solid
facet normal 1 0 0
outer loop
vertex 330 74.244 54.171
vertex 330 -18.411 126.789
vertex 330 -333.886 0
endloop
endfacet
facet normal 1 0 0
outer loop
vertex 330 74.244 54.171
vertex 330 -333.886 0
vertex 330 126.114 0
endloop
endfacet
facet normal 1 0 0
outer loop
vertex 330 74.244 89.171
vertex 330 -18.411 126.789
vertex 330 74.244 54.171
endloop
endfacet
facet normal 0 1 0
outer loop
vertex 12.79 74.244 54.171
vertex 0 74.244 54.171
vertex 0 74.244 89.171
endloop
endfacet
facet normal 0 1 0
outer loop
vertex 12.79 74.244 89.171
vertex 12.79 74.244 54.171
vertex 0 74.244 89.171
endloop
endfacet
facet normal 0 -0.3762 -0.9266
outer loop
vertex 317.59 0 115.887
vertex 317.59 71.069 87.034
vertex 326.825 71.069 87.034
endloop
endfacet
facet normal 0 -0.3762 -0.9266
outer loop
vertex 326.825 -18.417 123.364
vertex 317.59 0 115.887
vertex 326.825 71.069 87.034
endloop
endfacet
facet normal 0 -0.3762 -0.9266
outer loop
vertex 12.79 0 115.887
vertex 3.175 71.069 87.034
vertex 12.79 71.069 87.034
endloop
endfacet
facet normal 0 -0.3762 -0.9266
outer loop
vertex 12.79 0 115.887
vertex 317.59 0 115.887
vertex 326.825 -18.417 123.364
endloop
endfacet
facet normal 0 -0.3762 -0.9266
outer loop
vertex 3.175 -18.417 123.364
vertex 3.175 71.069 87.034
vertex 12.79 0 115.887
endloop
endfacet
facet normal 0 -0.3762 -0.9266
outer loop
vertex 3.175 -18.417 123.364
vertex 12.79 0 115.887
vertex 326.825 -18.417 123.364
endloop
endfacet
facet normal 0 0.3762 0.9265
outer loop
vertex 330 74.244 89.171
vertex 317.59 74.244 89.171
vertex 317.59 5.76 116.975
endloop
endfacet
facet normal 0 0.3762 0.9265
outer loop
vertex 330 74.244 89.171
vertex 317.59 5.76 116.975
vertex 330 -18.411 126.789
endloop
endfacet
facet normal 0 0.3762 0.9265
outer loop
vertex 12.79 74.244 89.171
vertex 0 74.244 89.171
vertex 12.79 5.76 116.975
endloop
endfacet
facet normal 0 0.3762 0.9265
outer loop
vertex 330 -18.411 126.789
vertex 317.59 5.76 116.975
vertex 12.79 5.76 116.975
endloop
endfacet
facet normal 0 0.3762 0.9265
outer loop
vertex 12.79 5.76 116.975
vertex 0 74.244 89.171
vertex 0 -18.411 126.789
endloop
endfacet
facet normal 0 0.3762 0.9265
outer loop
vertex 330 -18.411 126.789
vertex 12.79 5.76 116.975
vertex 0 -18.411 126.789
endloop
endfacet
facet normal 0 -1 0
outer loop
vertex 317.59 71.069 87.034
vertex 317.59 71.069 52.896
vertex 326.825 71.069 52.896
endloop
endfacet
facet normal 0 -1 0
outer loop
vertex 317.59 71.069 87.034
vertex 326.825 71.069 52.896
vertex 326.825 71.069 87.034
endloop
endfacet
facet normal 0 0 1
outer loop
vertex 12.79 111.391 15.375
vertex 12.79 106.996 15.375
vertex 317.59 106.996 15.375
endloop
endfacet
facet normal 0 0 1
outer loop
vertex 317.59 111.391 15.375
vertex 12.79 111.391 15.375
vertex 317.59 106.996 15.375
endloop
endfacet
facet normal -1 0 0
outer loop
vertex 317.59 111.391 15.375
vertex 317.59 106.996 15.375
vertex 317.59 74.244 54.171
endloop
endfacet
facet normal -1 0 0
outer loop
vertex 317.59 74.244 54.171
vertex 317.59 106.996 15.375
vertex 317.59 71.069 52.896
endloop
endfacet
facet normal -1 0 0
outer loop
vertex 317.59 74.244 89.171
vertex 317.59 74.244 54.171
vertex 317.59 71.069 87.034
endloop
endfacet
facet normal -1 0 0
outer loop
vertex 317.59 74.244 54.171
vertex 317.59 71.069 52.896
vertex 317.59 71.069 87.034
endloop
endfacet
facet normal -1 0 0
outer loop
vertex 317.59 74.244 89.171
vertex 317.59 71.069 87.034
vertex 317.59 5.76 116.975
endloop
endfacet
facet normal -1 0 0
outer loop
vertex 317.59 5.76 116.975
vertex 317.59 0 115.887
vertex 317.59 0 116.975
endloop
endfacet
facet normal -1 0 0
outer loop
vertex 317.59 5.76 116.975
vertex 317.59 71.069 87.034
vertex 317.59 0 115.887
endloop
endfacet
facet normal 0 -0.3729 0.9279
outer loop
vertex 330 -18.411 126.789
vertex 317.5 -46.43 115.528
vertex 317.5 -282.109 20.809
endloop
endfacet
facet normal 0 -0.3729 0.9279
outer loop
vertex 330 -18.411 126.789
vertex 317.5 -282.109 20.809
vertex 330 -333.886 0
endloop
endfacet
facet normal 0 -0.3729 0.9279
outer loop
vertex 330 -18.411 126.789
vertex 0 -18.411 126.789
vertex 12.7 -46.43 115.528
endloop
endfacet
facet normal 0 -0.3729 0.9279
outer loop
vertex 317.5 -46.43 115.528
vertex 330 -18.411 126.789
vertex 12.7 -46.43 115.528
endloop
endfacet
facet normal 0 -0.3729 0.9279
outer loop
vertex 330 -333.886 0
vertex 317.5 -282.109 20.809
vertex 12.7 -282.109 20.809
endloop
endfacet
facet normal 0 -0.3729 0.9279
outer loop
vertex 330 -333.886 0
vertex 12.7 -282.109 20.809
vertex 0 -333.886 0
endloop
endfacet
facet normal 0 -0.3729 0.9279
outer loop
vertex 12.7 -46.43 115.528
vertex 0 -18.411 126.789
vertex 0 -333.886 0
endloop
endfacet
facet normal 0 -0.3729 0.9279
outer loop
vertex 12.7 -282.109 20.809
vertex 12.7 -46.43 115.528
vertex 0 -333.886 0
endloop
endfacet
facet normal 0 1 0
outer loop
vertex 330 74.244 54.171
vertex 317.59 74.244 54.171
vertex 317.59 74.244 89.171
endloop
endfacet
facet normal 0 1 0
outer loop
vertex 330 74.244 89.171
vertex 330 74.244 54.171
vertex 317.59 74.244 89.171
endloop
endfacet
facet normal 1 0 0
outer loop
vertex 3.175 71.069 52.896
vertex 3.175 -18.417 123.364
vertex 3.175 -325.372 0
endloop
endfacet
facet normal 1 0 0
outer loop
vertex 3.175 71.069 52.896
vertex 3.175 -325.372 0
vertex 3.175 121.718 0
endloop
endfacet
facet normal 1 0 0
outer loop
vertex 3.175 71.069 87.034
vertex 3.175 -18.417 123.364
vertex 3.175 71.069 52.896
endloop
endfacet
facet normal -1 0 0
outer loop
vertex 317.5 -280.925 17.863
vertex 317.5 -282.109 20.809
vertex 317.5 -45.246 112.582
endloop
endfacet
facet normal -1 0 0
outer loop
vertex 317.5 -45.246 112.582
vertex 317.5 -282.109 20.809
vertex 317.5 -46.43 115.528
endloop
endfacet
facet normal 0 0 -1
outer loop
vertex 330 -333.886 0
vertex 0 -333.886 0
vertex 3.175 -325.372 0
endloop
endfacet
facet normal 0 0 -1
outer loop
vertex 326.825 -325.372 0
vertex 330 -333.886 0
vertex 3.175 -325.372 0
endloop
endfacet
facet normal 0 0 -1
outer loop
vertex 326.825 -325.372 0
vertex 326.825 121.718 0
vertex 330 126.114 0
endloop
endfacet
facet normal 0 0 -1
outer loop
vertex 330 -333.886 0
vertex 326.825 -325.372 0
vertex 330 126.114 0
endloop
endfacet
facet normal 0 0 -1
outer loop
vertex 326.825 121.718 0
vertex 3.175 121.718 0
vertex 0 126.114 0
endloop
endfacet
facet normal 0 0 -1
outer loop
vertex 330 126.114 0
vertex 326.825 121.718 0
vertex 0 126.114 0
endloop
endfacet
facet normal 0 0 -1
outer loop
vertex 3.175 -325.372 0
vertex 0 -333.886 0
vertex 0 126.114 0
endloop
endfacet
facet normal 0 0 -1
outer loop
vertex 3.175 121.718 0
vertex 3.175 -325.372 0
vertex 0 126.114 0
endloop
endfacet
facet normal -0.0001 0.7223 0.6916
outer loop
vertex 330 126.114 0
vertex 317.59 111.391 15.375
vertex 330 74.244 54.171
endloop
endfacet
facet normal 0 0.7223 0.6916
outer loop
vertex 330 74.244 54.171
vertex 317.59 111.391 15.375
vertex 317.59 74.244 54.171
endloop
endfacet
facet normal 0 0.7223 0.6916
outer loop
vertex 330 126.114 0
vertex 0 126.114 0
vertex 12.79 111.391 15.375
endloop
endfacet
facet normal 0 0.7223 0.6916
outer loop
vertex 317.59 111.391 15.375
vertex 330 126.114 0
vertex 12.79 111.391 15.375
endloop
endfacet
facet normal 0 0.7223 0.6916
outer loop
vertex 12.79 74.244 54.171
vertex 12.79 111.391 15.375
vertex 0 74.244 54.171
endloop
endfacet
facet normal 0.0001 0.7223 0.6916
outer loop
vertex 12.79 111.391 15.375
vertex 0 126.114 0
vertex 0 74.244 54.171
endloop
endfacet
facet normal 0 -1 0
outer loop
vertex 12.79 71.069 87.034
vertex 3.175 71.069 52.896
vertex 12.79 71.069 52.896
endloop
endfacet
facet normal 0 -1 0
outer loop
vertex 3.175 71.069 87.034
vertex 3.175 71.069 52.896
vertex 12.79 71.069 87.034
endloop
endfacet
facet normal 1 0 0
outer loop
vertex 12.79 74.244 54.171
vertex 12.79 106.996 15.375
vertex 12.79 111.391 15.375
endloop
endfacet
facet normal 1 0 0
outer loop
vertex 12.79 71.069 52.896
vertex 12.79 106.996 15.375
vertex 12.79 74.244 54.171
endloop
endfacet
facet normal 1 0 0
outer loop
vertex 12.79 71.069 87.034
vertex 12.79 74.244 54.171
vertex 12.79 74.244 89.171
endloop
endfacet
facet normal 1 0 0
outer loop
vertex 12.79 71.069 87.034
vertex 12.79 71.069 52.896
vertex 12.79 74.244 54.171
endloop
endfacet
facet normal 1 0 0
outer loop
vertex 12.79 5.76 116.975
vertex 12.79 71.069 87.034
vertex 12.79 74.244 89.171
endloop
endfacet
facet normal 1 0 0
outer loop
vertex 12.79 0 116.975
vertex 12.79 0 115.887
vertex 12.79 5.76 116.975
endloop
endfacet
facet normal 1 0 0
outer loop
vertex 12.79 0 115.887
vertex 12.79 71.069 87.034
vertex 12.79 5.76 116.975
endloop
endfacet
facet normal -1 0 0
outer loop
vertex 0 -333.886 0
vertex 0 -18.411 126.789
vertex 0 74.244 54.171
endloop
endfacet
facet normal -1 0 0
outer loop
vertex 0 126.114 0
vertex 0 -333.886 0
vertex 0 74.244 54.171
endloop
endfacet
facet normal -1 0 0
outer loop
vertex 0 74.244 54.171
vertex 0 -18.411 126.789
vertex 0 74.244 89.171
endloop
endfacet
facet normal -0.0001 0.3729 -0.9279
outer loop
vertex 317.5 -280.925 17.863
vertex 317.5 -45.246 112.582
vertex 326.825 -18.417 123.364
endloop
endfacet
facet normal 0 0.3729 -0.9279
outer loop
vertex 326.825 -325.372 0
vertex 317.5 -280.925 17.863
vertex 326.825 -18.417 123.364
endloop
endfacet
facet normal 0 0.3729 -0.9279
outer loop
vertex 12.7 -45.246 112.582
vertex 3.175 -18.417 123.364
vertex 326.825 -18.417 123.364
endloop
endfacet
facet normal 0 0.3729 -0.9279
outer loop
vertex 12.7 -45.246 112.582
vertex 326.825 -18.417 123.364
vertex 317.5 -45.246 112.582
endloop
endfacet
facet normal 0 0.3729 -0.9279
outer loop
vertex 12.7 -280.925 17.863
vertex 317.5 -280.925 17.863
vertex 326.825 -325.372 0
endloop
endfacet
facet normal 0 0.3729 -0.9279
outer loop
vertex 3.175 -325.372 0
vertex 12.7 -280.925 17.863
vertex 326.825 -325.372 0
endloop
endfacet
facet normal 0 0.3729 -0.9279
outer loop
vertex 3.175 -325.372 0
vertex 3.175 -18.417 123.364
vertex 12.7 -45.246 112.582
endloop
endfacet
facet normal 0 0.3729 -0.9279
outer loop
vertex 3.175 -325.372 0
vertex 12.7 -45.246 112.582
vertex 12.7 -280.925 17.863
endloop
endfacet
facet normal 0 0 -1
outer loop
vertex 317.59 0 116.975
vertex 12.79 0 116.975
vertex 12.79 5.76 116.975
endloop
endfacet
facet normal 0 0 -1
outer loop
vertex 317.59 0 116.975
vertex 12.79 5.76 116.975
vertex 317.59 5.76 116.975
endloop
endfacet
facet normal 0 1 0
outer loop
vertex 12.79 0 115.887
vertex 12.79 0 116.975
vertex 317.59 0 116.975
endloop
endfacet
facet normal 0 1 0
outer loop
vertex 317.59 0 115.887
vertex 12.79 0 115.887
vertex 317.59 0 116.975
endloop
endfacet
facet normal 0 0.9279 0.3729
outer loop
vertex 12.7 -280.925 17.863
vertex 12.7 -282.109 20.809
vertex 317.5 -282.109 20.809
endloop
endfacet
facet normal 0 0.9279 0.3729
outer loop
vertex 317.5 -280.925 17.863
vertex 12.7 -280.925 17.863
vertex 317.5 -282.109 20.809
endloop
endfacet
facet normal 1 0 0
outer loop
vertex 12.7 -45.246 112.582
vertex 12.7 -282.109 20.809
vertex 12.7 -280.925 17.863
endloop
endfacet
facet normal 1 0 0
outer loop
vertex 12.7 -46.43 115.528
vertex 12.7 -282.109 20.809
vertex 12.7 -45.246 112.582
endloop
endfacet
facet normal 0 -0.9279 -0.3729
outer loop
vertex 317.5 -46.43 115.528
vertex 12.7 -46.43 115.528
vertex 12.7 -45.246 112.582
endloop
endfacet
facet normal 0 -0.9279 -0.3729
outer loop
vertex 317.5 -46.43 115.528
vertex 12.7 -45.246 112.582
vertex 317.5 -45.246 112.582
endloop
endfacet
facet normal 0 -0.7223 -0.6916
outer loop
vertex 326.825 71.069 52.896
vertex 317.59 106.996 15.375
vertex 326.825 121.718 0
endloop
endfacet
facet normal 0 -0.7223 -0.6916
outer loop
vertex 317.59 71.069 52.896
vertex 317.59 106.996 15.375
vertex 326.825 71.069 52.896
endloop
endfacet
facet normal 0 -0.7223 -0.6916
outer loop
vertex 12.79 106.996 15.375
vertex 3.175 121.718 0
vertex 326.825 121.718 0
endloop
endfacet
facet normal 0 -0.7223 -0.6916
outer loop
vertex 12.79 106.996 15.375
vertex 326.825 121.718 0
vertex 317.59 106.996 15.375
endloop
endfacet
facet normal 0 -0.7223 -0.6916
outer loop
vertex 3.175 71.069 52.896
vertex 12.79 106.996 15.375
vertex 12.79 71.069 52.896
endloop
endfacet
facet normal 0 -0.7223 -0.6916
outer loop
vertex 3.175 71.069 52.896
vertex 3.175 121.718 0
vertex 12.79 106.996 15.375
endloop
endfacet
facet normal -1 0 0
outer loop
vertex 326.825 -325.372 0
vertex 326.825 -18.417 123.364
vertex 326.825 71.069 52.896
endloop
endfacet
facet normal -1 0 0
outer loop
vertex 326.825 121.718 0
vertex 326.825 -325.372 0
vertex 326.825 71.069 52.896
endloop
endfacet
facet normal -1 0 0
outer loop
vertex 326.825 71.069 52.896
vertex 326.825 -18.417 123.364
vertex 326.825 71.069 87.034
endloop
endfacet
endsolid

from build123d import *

# Parameters (mm, degrees)
F1_DEPTH = 330
F2_T     = -3.175
F3_W     = 304.8
F3_H     = 101.6
F4_DEPTH = 254
F5_W     = 304.8
F5_H     = 254
F6_DEPTH = 25.4


with BuildPart() as f1:
    # F0 (on Right) → F1 (new body)
    with BuildSketch(Plane.YZ):
        Polygon((-18.4111015737, 126.7885861181), (-333.886384964, 0), (126.113615036, 0), (74.243833744, 54.1712634957), (74.243833744, 89.1712634957), align=None)
    extrude(amount=F1_DEPTH)

    # F2
    f2_openings = [f1.faces().sort_by_distance(p)[0] for p in [
        (165, -103.886385, 0),
    ]]
    offset(amount=F2_T, openings=f2_openings, kind=Kind.INTERSECTION)

    # F3 (on Front) → F4 (cut)
    with BuildSketch(Plane.XZ):
        with Locations((165.1896406174, 66.1754549101)):
            Rectangle(F3_W, F3_H)
    extrude(amount=-F4_DEPTH, mode=Mode.SUBTRACT)

    # F5 (on face) → F6 (cut)
    with BuildSketch(Plane(origin=(0, -46.4302683335, 115.5277656205), x_dir=(1, 0, 0), z_dir=(0, -0.3729076062, 0.9278684806))):
        with Locations((165.1, -127)):
            Rectangle(F5_W, F5_H)
    extrude(amount=-F6_DEPTH, mode=Mode.SUBTRACT)


solid = f1.part
